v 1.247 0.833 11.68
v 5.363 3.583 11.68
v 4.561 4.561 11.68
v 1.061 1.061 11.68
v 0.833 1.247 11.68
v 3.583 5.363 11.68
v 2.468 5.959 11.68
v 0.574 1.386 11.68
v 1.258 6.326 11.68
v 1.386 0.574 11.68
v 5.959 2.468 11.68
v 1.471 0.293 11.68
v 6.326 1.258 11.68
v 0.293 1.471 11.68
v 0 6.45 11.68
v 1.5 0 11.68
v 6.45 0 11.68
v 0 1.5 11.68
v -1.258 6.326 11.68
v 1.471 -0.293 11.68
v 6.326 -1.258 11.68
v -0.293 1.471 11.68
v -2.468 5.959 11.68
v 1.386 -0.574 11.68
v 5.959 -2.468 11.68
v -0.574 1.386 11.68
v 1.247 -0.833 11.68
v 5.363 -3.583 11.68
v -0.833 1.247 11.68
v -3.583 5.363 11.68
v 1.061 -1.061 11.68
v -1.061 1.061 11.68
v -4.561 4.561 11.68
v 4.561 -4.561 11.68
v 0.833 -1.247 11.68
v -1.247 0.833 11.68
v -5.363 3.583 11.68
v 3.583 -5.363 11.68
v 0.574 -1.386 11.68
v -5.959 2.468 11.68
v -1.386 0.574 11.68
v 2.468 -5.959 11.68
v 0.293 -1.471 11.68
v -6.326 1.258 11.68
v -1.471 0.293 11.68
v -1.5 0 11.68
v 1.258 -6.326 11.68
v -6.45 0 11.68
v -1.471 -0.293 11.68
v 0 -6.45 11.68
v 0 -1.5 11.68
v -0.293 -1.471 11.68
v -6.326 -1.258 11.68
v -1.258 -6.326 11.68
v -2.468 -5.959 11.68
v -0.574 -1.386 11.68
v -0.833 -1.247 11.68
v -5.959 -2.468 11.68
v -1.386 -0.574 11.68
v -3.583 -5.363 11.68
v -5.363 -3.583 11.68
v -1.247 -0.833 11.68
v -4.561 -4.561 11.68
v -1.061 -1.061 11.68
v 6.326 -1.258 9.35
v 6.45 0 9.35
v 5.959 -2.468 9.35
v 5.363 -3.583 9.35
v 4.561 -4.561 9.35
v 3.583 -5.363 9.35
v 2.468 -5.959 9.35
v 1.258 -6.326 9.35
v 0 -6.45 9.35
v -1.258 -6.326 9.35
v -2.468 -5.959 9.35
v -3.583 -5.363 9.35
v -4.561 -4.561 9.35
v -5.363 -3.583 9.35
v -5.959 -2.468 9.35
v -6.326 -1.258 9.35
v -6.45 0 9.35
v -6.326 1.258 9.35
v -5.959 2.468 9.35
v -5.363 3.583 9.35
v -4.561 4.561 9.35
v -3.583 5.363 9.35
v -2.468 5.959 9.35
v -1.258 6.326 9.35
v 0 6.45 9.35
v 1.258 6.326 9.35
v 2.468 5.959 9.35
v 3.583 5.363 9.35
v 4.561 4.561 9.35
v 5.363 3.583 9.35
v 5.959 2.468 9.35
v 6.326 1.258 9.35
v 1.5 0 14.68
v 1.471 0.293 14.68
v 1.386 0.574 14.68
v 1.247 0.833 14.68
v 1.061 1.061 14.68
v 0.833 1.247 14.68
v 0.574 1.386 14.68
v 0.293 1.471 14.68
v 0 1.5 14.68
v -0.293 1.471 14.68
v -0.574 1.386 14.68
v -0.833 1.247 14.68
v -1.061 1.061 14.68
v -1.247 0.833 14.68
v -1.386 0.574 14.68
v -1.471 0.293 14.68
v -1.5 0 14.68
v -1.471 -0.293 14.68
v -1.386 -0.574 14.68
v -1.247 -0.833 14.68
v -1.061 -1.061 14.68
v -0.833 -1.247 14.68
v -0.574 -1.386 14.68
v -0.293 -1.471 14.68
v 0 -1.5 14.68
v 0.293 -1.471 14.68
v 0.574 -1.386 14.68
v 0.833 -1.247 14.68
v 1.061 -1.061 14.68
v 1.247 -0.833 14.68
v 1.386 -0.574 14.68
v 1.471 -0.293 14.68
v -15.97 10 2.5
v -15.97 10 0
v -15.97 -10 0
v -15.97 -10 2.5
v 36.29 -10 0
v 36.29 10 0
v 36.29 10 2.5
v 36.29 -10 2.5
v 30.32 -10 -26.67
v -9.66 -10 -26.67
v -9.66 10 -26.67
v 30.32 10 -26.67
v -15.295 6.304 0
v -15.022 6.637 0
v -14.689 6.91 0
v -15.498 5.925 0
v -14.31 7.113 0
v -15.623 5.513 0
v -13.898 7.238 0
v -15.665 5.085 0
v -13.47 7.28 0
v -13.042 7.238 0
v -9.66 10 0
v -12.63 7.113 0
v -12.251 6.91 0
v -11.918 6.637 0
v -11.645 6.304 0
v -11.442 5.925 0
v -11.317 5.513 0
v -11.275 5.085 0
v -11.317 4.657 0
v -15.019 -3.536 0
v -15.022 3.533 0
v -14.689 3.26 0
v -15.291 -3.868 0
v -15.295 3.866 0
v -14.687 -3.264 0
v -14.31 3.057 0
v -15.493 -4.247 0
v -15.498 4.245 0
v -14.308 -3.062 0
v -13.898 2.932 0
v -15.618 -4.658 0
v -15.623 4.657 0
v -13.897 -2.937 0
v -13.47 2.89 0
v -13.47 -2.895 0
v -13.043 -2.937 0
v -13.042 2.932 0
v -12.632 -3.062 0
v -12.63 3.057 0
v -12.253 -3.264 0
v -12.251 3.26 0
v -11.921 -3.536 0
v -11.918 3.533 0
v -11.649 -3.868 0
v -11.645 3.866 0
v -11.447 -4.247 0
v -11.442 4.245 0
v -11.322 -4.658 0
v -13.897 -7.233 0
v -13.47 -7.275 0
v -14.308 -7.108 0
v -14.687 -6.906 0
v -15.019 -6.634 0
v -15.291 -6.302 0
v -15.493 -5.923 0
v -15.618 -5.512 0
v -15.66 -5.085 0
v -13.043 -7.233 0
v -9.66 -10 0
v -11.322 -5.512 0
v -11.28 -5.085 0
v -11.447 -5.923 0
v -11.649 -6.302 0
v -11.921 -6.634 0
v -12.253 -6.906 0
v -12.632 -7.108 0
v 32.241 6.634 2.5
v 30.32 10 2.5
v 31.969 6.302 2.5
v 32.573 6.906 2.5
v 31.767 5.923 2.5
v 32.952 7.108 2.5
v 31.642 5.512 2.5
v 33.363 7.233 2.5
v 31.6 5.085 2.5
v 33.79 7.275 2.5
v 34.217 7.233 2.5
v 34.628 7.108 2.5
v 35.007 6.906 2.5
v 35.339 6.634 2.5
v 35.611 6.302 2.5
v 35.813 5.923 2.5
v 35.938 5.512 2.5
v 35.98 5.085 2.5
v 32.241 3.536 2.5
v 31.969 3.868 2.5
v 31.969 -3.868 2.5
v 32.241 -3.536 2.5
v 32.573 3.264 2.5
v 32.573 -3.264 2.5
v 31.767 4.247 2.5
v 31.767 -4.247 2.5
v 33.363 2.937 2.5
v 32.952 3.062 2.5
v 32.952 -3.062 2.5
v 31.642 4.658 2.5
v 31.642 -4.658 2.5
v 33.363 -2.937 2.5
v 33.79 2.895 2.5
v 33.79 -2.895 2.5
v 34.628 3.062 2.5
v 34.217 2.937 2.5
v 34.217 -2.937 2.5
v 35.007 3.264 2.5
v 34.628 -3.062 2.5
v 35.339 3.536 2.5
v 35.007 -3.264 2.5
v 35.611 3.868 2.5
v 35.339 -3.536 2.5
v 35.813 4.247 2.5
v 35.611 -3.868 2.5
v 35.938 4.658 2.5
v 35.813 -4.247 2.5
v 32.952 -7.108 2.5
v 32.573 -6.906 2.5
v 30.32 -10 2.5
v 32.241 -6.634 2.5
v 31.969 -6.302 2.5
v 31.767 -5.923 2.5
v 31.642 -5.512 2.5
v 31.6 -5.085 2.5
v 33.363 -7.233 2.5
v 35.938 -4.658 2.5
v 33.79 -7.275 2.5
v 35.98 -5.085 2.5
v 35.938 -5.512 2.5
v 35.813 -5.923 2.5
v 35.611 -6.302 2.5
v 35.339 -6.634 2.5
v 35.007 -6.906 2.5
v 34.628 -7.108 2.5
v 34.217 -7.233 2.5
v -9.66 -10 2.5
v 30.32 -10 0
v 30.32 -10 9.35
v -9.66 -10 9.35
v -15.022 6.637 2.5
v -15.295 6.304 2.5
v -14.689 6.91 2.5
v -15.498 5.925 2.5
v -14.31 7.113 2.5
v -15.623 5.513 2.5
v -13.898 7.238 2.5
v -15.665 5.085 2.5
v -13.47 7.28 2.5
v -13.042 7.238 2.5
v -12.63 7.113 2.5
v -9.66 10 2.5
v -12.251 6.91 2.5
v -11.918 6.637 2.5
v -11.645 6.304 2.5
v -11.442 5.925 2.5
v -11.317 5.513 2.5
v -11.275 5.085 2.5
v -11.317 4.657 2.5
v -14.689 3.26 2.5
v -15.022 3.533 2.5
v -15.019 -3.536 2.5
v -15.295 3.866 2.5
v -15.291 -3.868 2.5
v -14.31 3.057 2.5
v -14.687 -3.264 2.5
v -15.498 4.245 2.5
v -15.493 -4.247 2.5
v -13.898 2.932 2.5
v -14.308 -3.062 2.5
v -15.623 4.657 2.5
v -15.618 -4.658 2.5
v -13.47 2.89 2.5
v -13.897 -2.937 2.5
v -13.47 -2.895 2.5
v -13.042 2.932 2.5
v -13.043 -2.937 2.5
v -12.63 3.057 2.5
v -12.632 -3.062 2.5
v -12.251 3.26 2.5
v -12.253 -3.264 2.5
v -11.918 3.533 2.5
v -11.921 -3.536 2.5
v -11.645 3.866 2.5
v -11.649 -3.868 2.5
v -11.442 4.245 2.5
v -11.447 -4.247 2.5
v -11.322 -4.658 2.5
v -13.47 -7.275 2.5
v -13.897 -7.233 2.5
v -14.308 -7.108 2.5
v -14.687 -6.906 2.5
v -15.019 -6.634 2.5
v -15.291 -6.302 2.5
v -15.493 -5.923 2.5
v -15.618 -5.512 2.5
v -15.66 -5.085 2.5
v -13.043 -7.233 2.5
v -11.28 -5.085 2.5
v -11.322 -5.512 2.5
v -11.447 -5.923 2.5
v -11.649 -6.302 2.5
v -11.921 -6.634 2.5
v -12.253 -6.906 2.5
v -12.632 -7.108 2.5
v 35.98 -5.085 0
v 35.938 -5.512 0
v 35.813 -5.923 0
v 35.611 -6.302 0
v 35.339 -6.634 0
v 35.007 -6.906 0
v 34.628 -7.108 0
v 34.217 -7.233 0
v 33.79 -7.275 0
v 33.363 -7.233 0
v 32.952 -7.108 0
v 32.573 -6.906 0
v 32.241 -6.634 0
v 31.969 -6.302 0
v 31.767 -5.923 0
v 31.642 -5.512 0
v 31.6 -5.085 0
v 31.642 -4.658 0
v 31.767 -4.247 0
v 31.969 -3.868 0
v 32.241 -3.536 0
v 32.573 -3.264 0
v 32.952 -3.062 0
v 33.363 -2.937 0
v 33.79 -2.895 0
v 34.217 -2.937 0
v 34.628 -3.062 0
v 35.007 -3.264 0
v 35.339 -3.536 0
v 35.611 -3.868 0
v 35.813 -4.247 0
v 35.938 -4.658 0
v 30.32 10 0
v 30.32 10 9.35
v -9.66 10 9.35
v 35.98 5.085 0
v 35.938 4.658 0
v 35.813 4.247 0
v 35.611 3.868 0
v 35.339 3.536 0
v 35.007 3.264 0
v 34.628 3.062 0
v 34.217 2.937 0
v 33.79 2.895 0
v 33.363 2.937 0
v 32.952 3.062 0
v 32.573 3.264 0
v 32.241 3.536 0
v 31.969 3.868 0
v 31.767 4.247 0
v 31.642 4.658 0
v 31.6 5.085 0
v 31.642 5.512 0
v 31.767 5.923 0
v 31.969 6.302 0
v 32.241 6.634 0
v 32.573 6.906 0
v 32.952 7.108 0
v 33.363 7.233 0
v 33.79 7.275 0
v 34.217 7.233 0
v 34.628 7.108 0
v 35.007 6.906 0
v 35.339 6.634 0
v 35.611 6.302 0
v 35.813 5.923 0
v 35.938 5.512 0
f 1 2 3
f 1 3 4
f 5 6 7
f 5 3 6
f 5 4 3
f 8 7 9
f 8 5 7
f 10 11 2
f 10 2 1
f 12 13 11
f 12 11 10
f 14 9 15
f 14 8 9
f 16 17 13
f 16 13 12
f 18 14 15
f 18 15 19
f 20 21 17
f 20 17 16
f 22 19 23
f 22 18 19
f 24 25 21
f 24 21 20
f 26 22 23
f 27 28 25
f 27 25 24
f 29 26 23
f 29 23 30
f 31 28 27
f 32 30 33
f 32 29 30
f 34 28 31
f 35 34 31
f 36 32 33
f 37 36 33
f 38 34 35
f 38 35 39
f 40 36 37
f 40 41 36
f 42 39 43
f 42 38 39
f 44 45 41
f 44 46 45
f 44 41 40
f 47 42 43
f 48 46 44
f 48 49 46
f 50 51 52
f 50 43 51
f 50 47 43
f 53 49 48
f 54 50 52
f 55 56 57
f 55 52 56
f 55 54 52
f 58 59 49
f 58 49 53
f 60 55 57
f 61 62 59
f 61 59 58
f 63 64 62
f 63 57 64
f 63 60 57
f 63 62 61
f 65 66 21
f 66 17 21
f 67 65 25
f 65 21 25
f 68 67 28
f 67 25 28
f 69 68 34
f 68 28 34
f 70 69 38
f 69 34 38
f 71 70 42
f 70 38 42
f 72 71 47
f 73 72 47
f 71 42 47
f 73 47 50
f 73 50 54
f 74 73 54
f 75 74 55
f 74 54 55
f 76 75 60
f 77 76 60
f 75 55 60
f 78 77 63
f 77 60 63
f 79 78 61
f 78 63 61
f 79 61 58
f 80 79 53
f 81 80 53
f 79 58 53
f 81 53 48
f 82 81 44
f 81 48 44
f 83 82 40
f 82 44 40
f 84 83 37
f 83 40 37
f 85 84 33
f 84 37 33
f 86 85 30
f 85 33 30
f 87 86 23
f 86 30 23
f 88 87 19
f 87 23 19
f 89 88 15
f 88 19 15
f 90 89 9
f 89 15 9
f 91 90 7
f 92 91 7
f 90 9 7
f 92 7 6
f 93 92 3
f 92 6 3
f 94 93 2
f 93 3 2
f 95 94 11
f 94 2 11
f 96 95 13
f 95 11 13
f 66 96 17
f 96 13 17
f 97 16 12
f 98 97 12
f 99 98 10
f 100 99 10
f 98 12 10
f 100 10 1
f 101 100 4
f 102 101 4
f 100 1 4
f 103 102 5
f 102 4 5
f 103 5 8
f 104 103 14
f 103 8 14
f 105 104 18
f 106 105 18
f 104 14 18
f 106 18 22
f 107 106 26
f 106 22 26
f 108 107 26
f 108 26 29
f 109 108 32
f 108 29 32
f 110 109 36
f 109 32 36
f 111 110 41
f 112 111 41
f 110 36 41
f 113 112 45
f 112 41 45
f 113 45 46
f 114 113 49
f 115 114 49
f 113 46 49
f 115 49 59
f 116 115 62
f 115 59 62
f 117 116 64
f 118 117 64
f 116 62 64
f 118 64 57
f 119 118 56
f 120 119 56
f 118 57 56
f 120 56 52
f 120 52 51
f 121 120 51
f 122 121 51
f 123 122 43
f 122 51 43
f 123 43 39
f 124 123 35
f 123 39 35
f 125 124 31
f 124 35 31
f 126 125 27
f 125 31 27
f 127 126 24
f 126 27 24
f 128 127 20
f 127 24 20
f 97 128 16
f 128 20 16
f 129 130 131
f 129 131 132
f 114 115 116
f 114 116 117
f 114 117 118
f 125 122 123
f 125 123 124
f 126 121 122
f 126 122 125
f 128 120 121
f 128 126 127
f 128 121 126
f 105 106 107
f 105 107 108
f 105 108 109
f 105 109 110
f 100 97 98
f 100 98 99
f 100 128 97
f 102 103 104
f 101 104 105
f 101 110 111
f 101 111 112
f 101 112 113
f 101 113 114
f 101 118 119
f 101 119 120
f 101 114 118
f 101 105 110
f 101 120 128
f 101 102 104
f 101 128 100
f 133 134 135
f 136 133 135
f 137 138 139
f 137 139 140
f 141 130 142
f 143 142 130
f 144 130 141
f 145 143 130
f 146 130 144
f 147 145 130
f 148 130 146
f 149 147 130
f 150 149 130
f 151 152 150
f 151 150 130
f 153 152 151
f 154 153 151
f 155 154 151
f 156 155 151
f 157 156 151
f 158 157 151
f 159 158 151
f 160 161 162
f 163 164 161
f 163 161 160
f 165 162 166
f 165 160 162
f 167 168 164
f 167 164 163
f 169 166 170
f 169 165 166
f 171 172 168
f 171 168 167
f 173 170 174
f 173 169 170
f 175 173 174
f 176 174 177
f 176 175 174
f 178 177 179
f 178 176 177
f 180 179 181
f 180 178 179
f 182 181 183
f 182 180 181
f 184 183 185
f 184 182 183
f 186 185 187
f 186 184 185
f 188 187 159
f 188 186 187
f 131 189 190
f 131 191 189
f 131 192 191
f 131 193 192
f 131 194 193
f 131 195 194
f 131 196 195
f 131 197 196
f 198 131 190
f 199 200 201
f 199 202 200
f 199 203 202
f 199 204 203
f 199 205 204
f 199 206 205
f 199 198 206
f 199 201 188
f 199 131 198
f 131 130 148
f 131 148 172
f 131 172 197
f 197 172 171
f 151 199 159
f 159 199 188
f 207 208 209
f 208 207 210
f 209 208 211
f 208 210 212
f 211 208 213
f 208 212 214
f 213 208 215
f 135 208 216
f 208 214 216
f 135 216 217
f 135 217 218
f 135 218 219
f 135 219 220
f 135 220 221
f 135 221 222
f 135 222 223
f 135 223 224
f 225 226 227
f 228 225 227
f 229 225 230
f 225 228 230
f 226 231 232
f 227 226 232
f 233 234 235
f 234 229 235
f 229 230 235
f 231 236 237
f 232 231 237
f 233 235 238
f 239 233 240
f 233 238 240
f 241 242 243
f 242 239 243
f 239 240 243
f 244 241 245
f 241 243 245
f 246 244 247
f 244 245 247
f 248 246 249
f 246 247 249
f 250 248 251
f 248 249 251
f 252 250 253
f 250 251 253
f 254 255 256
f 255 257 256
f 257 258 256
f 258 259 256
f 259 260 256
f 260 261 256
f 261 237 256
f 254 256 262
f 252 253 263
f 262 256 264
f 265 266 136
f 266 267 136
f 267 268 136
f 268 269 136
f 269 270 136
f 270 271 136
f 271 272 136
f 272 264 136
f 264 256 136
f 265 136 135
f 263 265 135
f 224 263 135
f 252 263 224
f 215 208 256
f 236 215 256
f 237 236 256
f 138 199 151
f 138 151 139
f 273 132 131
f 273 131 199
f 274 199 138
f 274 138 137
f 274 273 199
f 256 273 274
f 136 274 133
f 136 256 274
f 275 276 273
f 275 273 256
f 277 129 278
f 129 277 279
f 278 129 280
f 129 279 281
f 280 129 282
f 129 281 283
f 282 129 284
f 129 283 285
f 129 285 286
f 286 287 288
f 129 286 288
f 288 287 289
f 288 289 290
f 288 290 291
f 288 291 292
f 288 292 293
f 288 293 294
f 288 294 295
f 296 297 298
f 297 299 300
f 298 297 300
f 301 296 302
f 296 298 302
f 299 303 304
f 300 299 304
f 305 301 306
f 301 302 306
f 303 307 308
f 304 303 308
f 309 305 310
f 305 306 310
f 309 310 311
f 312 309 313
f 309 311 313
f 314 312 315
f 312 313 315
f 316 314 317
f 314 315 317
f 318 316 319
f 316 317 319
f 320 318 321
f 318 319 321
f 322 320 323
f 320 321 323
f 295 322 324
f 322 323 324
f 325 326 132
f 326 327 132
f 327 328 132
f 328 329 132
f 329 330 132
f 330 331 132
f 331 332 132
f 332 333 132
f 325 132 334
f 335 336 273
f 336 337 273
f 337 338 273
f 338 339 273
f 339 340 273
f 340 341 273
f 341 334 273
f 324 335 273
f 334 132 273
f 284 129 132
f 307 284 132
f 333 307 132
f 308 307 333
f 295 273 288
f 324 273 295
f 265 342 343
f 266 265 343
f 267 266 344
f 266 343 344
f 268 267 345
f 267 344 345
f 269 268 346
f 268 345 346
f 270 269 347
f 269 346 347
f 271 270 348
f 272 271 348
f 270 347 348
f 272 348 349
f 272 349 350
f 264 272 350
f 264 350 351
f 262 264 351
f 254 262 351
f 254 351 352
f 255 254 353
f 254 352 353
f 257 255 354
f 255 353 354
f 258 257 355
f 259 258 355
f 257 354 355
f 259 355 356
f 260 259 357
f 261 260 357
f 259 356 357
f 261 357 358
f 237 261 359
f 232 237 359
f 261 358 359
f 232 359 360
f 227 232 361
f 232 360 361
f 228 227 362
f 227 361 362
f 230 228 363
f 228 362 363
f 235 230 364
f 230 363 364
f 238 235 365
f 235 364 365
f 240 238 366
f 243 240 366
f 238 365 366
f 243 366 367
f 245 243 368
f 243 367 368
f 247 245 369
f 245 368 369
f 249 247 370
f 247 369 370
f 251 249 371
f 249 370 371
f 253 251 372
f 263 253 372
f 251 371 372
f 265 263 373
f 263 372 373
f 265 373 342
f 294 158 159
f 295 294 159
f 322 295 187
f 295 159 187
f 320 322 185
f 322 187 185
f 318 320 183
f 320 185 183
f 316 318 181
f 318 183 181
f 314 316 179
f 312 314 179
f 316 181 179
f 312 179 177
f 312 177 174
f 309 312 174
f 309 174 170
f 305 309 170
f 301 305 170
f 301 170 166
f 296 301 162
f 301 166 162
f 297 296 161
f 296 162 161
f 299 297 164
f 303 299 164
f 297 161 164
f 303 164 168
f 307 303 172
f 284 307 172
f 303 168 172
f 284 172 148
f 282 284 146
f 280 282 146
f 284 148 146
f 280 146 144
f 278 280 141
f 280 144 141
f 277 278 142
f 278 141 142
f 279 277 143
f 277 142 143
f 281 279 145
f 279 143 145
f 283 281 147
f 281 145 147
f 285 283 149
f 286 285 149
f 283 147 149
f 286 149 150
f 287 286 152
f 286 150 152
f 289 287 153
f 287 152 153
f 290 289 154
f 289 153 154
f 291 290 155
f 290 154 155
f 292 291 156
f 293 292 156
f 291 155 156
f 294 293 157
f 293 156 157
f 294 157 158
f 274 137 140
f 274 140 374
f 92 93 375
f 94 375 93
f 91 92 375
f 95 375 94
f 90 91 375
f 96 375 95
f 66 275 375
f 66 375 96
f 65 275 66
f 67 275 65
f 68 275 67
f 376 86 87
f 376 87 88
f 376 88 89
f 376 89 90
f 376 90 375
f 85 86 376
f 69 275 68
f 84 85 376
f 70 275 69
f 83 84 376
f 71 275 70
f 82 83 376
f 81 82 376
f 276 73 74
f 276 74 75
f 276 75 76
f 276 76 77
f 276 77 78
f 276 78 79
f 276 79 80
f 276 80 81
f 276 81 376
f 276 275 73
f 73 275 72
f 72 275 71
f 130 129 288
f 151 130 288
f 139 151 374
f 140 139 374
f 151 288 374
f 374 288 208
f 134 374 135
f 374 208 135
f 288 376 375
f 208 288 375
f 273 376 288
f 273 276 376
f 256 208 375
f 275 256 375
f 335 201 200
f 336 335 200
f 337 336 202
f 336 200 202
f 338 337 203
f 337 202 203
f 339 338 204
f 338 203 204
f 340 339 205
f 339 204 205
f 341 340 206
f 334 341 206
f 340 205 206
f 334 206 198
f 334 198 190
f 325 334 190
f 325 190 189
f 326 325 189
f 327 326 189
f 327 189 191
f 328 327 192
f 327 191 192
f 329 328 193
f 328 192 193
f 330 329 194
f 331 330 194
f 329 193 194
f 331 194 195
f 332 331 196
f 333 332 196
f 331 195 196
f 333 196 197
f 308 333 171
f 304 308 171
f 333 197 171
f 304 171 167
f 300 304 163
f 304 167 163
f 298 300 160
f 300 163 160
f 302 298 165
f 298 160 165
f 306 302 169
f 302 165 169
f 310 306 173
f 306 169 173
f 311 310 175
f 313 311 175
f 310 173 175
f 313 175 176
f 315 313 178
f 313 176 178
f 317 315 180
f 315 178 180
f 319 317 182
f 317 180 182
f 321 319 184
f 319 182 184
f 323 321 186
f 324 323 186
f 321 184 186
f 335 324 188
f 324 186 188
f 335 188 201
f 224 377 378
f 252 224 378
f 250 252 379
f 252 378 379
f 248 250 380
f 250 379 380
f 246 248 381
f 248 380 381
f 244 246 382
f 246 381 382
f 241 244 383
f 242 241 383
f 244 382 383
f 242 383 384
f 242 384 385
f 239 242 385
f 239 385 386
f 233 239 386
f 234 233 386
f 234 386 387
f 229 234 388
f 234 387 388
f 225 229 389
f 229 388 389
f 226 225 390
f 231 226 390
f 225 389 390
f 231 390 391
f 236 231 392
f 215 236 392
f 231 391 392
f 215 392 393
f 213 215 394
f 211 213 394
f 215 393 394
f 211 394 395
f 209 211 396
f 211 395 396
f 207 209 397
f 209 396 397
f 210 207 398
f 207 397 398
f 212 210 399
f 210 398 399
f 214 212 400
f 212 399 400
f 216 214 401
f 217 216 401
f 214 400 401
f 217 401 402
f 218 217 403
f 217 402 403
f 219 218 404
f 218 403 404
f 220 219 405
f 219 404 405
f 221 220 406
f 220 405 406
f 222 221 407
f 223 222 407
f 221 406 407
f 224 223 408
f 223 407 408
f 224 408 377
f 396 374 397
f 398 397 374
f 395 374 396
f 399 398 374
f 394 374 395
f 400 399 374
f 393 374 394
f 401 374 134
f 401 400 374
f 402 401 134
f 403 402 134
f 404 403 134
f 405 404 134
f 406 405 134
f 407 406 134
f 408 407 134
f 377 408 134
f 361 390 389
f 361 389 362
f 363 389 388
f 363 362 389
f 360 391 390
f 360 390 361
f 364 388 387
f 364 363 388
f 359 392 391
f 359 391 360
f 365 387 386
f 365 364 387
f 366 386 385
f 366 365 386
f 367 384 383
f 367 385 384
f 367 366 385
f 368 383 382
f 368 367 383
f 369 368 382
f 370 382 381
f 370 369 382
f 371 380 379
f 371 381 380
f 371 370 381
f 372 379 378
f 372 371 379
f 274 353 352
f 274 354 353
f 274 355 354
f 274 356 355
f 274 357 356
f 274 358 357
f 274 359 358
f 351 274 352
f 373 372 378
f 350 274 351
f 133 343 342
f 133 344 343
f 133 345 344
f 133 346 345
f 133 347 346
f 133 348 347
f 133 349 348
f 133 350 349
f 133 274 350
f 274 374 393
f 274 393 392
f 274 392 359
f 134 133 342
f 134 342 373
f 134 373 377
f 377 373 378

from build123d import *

# Parameters (mm, degrees)
F0_W     = 5.97
F0_H     = 2.5
F0_W_2   = 6.31
F1_DEPTH = 10
F0_W_3   = 6.45
F0_H_2   = 2.33
F3_R     = 2.19
F3_R_2   = 2.195
F4_DEPTH = 2.5
F5_R     = 2.19
F6_DEPTH = 2.5
F7_R     = 1.5
F8_DEPTH = 3


with BuildPart() as f1:
    # F0 (on Front) → F1 (new body, symmetric)
    with BuildSketch(Plane.XZ):
        Polygon((-6.45, 9.35), (-9.66, 9.35), (-9.66, 2.5), (-9.66, 0), (-9.66, -26.67), (30.32, -26.67), (30.32, 0), (30.32, 2.5), (30.32, 9.35), (6.45, 9.35), (0, 9.35), align=None)
        with Locations((33.305, 1.25)):
            Rectangle(F0_W, F0_H)
        with Locations((-12.815, 1.25)):
            Rectangle(F0_W_2, F0_H)
    extrude(amount=F1_DEPTH, both=True)

    # F0 (on Front) → F2 (revolve)
    with BuildSketch(Plane.XZ):
        with Locations((3.225, 10.515)):
            Rectangle(F0_W_3, F0_H_2)
    revolve(axis=Axis((0, 0, -16.804387), (0, 0, -1)))

    # F3 (on face) → F4 (cut, through all)
    with BuildSketch(Plane(origin=(0, 0, 0), x_dir=(1, 0, 0), z_dir=(0, 0, -1))):
        with Locations((-13.47, 5.085)):
            Circle(F3_R)
        with Locations((-13.47, -5.085)):
            Circle(F3_R_2)
    extrude(amount=-F4_DEPTH, mode=Mode.SUBTRACT)

    # F5 (on face) → F6 (cut, through all)
    with BuildSketch(Plane(origin=(0, 0, 0), x_dir=(1, 0, 0), z_dir=(0, 0, -1))):
        with Locations((33.79, 5.085)):
            Circle(F5_R)
        with Locations((33.79, -5.085)):
            Circle(F5_R)
    extrude(amount=-F6_DEPTH, mode=Mode.SUBTRACT)

    # F7 (on face) → F8 (join)
    with BuildSketch(Plane.XY.offset(11.68)):
        Circle(F7_R)
    extrude(amount=F8_DEPTH)


solid = f1.part
